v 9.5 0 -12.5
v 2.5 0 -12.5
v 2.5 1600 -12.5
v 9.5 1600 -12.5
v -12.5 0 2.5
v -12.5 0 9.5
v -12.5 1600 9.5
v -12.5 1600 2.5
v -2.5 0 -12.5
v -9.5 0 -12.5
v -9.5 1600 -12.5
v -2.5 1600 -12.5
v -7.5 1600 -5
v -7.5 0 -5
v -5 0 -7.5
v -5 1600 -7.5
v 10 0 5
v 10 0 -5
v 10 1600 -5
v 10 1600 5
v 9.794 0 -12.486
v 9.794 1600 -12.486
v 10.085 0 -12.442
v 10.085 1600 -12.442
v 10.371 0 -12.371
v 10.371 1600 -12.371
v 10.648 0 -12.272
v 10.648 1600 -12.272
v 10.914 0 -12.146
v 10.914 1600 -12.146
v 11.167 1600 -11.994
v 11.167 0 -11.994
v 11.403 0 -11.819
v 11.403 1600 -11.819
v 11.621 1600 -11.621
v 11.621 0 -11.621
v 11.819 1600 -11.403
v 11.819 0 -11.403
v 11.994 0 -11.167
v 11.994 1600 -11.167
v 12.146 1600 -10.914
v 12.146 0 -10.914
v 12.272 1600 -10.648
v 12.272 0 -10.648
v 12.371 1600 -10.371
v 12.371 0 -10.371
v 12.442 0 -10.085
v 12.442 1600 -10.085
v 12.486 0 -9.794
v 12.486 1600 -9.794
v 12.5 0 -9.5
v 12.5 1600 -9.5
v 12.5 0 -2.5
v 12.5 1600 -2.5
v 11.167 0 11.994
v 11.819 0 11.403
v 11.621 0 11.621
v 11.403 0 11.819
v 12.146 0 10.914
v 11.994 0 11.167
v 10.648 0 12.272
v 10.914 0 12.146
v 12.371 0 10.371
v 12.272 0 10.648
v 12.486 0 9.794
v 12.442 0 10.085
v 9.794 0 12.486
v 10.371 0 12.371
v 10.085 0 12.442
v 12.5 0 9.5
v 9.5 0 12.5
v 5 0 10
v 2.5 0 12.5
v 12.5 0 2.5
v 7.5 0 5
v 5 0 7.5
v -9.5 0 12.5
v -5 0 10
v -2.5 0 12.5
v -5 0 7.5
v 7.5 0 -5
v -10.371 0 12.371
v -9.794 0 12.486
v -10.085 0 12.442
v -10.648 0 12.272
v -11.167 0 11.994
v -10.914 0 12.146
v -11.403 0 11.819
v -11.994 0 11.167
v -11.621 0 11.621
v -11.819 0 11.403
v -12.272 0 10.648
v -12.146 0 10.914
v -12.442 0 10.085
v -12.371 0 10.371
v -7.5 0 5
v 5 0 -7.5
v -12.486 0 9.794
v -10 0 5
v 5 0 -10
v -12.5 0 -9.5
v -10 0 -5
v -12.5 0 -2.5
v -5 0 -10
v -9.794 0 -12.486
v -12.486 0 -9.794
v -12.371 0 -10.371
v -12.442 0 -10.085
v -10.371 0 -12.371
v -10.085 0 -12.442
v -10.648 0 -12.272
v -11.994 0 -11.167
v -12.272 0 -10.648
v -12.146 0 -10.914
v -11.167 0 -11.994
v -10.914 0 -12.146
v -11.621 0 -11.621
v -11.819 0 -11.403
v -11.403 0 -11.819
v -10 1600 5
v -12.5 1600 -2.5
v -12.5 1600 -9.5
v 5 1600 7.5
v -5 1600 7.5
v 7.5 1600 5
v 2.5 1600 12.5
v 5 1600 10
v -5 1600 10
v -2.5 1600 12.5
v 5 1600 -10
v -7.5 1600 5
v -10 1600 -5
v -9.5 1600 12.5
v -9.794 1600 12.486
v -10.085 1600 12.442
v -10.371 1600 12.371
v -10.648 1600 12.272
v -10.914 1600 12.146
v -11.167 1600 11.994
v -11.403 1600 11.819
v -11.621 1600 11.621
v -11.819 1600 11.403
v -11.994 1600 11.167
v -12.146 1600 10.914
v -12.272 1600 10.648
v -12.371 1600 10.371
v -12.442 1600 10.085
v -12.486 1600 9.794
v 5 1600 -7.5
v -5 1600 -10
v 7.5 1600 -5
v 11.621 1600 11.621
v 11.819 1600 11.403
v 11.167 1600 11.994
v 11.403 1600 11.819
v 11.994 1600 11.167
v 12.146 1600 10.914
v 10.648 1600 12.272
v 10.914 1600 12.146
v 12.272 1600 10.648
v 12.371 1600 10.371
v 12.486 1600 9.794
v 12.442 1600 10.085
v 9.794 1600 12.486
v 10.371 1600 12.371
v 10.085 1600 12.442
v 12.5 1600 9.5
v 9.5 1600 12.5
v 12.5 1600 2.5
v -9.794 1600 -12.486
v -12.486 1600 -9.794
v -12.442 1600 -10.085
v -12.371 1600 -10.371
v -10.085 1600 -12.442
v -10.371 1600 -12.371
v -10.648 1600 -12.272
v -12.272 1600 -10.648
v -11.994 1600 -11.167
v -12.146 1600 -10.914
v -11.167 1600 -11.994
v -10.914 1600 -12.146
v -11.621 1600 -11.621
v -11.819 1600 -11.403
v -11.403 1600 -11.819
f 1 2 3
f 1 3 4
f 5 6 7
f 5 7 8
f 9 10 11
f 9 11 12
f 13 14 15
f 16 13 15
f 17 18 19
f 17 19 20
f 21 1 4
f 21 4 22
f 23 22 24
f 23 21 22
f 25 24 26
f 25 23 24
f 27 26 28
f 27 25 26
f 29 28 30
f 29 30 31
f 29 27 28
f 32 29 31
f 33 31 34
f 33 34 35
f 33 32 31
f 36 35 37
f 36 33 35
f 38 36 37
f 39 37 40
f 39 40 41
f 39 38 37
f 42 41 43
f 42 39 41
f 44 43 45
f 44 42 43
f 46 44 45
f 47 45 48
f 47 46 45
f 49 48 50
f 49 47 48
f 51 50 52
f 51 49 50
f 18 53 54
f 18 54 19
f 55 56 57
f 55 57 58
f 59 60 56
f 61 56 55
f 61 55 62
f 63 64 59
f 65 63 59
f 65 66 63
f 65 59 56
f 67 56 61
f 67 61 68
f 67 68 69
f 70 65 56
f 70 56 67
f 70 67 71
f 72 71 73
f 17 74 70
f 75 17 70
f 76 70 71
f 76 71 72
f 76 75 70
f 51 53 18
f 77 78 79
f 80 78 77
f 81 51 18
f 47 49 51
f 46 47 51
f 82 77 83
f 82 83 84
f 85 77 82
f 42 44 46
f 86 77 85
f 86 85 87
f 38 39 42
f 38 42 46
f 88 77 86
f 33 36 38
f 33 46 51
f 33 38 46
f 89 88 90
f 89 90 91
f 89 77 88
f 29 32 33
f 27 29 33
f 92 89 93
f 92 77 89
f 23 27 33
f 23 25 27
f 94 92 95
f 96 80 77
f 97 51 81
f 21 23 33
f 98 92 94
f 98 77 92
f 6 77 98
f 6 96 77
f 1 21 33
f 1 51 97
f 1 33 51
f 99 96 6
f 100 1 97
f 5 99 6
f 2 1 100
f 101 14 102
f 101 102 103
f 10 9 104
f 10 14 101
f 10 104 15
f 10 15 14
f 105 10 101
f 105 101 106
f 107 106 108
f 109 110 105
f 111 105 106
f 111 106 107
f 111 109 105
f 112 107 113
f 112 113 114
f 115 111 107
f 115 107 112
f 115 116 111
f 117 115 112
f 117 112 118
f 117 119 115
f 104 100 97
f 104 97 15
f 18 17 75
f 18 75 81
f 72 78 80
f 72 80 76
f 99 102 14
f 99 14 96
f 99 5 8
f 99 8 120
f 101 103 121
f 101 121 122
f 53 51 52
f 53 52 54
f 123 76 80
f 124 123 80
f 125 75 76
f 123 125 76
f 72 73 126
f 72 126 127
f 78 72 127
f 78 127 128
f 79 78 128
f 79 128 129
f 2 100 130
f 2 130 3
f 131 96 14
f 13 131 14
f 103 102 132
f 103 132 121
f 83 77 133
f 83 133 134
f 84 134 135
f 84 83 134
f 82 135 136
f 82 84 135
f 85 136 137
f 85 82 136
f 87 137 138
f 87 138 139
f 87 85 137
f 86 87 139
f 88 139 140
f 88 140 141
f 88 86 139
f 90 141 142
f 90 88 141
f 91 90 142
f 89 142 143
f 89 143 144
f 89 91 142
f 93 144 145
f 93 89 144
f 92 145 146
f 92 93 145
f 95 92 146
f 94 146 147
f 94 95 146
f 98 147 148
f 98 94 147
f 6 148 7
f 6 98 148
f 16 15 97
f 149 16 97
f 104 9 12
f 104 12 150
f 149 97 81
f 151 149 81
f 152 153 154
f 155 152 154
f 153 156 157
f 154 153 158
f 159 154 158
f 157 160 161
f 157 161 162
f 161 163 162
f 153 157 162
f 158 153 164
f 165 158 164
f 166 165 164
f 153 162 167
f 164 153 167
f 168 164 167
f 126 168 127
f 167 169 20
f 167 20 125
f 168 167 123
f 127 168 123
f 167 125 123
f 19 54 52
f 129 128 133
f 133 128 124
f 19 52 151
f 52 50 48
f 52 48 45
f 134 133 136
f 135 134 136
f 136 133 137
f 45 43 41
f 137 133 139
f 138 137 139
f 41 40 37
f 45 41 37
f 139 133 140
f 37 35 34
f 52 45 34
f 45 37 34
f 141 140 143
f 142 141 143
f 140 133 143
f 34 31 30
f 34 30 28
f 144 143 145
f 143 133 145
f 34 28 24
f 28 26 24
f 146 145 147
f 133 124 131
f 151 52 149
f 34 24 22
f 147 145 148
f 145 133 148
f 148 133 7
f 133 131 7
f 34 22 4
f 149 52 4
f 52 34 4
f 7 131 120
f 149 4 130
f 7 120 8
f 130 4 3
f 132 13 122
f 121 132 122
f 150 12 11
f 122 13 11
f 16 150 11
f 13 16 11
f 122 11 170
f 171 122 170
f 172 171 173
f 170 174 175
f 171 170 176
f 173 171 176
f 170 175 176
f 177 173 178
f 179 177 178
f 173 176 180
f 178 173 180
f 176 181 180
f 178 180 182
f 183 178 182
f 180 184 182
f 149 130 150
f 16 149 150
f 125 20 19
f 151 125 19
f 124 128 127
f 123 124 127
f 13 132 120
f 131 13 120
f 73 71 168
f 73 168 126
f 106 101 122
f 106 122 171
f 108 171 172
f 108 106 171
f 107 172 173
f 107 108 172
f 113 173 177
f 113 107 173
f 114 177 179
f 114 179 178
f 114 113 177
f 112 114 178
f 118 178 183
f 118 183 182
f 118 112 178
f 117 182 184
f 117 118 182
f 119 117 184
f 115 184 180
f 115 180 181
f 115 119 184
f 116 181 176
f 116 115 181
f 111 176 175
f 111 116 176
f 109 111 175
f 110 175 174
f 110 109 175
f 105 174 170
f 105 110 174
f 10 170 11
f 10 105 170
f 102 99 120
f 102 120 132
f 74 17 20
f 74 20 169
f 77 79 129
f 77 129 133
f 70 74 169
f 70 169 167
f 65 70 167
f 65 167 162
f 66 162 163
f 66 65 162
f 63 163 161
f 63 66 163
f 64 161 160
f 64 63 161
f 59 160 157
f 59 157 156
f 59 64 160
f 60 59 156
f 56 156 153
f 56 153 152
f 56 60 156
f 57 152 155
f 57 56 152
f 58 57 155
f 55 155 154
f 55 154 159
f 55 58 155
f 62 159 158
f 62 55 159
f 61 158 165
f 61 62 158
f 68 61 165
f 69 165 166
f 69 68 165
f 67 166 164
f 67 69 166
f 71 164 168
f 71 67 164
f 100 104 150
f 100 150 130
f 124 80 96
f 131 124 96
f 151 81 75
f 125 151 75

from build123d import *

# Parameters (mm, degrees)
BOSS_EXTRUDE1_DEPTH = 1600


with BuildPart() as part:
    # Sketch1 → Boss-Extrude1 (new body)
    with BuildSketch(Plane(origin=(0, 0, 0), x_dir=(1, 0, 0), z_dir=(0, 1, 0))):
        with BuildLine():
            Line((-9.5, 12.5), (-2.5, 12.5))
            Line((-2.5, 12.5), (-5, 10))
            Line((-5, 10), (5, 10))
            Line((5, 10), (2.5, 12.5))
            Line((2.5, 12.5), (9.5, 12.5))
            ThreePointArc((9.5, 12.5), (11.621320344, 11.621320344), (12.5, 9.5))
            Line((12.5, 9.5), (12.5, 2.5))
            Line((12.5, 2.5), (10, 5))
            Line((10, 5), (10, -5))
            Line((10, -5), (12.5, -2.5))
            Line((12.5, -2.5), (12.5, -9.5))
            ThreePointArc((12.5, -9.5), (11.621320344, -11.621320344), (9.5, -12.5))
            Line((9.5, -12.5), (2.5, -12.5))
            Line((2.5, -12.5), (5, -10))
            Line((5, -10), (-5, -10))
            Line((-5, -10), (-2.5, -12.5))
            Line((-2.5, -12.5), (-9.5, -12.5))
            ThreePointArc((-9.5, -12.5), (-11.621320344, -11.621320344), (-12.5, -9.5))
            Line((-12.5, -9.5), (-12.5, -2.5))
            Line((-12.5, -2.5), (-10, -5))
            Line((-10, -5), (-10, 5))
            Line((-10, 5), (-12.5, 2.5))
            Line((-12.5, 2.5), (-12.5, 9.5))
            ThreePointArc((-12.5, 9.5), (-11.621320344, 11.621320344), (-9.5, 12.5))
        make_face()
        Polygon((-7.5, 5), (-5, 7.5), (5, 7.5), (7.5, 5), (7.5, -5), (5, -7.5), (-5, -7.5), (-7.5, -5), align=None, mode=Mode.SUBTRACT)
    extrude(amount=BOSS_EXTRUDE1_DEPTH)


solid = part.part
